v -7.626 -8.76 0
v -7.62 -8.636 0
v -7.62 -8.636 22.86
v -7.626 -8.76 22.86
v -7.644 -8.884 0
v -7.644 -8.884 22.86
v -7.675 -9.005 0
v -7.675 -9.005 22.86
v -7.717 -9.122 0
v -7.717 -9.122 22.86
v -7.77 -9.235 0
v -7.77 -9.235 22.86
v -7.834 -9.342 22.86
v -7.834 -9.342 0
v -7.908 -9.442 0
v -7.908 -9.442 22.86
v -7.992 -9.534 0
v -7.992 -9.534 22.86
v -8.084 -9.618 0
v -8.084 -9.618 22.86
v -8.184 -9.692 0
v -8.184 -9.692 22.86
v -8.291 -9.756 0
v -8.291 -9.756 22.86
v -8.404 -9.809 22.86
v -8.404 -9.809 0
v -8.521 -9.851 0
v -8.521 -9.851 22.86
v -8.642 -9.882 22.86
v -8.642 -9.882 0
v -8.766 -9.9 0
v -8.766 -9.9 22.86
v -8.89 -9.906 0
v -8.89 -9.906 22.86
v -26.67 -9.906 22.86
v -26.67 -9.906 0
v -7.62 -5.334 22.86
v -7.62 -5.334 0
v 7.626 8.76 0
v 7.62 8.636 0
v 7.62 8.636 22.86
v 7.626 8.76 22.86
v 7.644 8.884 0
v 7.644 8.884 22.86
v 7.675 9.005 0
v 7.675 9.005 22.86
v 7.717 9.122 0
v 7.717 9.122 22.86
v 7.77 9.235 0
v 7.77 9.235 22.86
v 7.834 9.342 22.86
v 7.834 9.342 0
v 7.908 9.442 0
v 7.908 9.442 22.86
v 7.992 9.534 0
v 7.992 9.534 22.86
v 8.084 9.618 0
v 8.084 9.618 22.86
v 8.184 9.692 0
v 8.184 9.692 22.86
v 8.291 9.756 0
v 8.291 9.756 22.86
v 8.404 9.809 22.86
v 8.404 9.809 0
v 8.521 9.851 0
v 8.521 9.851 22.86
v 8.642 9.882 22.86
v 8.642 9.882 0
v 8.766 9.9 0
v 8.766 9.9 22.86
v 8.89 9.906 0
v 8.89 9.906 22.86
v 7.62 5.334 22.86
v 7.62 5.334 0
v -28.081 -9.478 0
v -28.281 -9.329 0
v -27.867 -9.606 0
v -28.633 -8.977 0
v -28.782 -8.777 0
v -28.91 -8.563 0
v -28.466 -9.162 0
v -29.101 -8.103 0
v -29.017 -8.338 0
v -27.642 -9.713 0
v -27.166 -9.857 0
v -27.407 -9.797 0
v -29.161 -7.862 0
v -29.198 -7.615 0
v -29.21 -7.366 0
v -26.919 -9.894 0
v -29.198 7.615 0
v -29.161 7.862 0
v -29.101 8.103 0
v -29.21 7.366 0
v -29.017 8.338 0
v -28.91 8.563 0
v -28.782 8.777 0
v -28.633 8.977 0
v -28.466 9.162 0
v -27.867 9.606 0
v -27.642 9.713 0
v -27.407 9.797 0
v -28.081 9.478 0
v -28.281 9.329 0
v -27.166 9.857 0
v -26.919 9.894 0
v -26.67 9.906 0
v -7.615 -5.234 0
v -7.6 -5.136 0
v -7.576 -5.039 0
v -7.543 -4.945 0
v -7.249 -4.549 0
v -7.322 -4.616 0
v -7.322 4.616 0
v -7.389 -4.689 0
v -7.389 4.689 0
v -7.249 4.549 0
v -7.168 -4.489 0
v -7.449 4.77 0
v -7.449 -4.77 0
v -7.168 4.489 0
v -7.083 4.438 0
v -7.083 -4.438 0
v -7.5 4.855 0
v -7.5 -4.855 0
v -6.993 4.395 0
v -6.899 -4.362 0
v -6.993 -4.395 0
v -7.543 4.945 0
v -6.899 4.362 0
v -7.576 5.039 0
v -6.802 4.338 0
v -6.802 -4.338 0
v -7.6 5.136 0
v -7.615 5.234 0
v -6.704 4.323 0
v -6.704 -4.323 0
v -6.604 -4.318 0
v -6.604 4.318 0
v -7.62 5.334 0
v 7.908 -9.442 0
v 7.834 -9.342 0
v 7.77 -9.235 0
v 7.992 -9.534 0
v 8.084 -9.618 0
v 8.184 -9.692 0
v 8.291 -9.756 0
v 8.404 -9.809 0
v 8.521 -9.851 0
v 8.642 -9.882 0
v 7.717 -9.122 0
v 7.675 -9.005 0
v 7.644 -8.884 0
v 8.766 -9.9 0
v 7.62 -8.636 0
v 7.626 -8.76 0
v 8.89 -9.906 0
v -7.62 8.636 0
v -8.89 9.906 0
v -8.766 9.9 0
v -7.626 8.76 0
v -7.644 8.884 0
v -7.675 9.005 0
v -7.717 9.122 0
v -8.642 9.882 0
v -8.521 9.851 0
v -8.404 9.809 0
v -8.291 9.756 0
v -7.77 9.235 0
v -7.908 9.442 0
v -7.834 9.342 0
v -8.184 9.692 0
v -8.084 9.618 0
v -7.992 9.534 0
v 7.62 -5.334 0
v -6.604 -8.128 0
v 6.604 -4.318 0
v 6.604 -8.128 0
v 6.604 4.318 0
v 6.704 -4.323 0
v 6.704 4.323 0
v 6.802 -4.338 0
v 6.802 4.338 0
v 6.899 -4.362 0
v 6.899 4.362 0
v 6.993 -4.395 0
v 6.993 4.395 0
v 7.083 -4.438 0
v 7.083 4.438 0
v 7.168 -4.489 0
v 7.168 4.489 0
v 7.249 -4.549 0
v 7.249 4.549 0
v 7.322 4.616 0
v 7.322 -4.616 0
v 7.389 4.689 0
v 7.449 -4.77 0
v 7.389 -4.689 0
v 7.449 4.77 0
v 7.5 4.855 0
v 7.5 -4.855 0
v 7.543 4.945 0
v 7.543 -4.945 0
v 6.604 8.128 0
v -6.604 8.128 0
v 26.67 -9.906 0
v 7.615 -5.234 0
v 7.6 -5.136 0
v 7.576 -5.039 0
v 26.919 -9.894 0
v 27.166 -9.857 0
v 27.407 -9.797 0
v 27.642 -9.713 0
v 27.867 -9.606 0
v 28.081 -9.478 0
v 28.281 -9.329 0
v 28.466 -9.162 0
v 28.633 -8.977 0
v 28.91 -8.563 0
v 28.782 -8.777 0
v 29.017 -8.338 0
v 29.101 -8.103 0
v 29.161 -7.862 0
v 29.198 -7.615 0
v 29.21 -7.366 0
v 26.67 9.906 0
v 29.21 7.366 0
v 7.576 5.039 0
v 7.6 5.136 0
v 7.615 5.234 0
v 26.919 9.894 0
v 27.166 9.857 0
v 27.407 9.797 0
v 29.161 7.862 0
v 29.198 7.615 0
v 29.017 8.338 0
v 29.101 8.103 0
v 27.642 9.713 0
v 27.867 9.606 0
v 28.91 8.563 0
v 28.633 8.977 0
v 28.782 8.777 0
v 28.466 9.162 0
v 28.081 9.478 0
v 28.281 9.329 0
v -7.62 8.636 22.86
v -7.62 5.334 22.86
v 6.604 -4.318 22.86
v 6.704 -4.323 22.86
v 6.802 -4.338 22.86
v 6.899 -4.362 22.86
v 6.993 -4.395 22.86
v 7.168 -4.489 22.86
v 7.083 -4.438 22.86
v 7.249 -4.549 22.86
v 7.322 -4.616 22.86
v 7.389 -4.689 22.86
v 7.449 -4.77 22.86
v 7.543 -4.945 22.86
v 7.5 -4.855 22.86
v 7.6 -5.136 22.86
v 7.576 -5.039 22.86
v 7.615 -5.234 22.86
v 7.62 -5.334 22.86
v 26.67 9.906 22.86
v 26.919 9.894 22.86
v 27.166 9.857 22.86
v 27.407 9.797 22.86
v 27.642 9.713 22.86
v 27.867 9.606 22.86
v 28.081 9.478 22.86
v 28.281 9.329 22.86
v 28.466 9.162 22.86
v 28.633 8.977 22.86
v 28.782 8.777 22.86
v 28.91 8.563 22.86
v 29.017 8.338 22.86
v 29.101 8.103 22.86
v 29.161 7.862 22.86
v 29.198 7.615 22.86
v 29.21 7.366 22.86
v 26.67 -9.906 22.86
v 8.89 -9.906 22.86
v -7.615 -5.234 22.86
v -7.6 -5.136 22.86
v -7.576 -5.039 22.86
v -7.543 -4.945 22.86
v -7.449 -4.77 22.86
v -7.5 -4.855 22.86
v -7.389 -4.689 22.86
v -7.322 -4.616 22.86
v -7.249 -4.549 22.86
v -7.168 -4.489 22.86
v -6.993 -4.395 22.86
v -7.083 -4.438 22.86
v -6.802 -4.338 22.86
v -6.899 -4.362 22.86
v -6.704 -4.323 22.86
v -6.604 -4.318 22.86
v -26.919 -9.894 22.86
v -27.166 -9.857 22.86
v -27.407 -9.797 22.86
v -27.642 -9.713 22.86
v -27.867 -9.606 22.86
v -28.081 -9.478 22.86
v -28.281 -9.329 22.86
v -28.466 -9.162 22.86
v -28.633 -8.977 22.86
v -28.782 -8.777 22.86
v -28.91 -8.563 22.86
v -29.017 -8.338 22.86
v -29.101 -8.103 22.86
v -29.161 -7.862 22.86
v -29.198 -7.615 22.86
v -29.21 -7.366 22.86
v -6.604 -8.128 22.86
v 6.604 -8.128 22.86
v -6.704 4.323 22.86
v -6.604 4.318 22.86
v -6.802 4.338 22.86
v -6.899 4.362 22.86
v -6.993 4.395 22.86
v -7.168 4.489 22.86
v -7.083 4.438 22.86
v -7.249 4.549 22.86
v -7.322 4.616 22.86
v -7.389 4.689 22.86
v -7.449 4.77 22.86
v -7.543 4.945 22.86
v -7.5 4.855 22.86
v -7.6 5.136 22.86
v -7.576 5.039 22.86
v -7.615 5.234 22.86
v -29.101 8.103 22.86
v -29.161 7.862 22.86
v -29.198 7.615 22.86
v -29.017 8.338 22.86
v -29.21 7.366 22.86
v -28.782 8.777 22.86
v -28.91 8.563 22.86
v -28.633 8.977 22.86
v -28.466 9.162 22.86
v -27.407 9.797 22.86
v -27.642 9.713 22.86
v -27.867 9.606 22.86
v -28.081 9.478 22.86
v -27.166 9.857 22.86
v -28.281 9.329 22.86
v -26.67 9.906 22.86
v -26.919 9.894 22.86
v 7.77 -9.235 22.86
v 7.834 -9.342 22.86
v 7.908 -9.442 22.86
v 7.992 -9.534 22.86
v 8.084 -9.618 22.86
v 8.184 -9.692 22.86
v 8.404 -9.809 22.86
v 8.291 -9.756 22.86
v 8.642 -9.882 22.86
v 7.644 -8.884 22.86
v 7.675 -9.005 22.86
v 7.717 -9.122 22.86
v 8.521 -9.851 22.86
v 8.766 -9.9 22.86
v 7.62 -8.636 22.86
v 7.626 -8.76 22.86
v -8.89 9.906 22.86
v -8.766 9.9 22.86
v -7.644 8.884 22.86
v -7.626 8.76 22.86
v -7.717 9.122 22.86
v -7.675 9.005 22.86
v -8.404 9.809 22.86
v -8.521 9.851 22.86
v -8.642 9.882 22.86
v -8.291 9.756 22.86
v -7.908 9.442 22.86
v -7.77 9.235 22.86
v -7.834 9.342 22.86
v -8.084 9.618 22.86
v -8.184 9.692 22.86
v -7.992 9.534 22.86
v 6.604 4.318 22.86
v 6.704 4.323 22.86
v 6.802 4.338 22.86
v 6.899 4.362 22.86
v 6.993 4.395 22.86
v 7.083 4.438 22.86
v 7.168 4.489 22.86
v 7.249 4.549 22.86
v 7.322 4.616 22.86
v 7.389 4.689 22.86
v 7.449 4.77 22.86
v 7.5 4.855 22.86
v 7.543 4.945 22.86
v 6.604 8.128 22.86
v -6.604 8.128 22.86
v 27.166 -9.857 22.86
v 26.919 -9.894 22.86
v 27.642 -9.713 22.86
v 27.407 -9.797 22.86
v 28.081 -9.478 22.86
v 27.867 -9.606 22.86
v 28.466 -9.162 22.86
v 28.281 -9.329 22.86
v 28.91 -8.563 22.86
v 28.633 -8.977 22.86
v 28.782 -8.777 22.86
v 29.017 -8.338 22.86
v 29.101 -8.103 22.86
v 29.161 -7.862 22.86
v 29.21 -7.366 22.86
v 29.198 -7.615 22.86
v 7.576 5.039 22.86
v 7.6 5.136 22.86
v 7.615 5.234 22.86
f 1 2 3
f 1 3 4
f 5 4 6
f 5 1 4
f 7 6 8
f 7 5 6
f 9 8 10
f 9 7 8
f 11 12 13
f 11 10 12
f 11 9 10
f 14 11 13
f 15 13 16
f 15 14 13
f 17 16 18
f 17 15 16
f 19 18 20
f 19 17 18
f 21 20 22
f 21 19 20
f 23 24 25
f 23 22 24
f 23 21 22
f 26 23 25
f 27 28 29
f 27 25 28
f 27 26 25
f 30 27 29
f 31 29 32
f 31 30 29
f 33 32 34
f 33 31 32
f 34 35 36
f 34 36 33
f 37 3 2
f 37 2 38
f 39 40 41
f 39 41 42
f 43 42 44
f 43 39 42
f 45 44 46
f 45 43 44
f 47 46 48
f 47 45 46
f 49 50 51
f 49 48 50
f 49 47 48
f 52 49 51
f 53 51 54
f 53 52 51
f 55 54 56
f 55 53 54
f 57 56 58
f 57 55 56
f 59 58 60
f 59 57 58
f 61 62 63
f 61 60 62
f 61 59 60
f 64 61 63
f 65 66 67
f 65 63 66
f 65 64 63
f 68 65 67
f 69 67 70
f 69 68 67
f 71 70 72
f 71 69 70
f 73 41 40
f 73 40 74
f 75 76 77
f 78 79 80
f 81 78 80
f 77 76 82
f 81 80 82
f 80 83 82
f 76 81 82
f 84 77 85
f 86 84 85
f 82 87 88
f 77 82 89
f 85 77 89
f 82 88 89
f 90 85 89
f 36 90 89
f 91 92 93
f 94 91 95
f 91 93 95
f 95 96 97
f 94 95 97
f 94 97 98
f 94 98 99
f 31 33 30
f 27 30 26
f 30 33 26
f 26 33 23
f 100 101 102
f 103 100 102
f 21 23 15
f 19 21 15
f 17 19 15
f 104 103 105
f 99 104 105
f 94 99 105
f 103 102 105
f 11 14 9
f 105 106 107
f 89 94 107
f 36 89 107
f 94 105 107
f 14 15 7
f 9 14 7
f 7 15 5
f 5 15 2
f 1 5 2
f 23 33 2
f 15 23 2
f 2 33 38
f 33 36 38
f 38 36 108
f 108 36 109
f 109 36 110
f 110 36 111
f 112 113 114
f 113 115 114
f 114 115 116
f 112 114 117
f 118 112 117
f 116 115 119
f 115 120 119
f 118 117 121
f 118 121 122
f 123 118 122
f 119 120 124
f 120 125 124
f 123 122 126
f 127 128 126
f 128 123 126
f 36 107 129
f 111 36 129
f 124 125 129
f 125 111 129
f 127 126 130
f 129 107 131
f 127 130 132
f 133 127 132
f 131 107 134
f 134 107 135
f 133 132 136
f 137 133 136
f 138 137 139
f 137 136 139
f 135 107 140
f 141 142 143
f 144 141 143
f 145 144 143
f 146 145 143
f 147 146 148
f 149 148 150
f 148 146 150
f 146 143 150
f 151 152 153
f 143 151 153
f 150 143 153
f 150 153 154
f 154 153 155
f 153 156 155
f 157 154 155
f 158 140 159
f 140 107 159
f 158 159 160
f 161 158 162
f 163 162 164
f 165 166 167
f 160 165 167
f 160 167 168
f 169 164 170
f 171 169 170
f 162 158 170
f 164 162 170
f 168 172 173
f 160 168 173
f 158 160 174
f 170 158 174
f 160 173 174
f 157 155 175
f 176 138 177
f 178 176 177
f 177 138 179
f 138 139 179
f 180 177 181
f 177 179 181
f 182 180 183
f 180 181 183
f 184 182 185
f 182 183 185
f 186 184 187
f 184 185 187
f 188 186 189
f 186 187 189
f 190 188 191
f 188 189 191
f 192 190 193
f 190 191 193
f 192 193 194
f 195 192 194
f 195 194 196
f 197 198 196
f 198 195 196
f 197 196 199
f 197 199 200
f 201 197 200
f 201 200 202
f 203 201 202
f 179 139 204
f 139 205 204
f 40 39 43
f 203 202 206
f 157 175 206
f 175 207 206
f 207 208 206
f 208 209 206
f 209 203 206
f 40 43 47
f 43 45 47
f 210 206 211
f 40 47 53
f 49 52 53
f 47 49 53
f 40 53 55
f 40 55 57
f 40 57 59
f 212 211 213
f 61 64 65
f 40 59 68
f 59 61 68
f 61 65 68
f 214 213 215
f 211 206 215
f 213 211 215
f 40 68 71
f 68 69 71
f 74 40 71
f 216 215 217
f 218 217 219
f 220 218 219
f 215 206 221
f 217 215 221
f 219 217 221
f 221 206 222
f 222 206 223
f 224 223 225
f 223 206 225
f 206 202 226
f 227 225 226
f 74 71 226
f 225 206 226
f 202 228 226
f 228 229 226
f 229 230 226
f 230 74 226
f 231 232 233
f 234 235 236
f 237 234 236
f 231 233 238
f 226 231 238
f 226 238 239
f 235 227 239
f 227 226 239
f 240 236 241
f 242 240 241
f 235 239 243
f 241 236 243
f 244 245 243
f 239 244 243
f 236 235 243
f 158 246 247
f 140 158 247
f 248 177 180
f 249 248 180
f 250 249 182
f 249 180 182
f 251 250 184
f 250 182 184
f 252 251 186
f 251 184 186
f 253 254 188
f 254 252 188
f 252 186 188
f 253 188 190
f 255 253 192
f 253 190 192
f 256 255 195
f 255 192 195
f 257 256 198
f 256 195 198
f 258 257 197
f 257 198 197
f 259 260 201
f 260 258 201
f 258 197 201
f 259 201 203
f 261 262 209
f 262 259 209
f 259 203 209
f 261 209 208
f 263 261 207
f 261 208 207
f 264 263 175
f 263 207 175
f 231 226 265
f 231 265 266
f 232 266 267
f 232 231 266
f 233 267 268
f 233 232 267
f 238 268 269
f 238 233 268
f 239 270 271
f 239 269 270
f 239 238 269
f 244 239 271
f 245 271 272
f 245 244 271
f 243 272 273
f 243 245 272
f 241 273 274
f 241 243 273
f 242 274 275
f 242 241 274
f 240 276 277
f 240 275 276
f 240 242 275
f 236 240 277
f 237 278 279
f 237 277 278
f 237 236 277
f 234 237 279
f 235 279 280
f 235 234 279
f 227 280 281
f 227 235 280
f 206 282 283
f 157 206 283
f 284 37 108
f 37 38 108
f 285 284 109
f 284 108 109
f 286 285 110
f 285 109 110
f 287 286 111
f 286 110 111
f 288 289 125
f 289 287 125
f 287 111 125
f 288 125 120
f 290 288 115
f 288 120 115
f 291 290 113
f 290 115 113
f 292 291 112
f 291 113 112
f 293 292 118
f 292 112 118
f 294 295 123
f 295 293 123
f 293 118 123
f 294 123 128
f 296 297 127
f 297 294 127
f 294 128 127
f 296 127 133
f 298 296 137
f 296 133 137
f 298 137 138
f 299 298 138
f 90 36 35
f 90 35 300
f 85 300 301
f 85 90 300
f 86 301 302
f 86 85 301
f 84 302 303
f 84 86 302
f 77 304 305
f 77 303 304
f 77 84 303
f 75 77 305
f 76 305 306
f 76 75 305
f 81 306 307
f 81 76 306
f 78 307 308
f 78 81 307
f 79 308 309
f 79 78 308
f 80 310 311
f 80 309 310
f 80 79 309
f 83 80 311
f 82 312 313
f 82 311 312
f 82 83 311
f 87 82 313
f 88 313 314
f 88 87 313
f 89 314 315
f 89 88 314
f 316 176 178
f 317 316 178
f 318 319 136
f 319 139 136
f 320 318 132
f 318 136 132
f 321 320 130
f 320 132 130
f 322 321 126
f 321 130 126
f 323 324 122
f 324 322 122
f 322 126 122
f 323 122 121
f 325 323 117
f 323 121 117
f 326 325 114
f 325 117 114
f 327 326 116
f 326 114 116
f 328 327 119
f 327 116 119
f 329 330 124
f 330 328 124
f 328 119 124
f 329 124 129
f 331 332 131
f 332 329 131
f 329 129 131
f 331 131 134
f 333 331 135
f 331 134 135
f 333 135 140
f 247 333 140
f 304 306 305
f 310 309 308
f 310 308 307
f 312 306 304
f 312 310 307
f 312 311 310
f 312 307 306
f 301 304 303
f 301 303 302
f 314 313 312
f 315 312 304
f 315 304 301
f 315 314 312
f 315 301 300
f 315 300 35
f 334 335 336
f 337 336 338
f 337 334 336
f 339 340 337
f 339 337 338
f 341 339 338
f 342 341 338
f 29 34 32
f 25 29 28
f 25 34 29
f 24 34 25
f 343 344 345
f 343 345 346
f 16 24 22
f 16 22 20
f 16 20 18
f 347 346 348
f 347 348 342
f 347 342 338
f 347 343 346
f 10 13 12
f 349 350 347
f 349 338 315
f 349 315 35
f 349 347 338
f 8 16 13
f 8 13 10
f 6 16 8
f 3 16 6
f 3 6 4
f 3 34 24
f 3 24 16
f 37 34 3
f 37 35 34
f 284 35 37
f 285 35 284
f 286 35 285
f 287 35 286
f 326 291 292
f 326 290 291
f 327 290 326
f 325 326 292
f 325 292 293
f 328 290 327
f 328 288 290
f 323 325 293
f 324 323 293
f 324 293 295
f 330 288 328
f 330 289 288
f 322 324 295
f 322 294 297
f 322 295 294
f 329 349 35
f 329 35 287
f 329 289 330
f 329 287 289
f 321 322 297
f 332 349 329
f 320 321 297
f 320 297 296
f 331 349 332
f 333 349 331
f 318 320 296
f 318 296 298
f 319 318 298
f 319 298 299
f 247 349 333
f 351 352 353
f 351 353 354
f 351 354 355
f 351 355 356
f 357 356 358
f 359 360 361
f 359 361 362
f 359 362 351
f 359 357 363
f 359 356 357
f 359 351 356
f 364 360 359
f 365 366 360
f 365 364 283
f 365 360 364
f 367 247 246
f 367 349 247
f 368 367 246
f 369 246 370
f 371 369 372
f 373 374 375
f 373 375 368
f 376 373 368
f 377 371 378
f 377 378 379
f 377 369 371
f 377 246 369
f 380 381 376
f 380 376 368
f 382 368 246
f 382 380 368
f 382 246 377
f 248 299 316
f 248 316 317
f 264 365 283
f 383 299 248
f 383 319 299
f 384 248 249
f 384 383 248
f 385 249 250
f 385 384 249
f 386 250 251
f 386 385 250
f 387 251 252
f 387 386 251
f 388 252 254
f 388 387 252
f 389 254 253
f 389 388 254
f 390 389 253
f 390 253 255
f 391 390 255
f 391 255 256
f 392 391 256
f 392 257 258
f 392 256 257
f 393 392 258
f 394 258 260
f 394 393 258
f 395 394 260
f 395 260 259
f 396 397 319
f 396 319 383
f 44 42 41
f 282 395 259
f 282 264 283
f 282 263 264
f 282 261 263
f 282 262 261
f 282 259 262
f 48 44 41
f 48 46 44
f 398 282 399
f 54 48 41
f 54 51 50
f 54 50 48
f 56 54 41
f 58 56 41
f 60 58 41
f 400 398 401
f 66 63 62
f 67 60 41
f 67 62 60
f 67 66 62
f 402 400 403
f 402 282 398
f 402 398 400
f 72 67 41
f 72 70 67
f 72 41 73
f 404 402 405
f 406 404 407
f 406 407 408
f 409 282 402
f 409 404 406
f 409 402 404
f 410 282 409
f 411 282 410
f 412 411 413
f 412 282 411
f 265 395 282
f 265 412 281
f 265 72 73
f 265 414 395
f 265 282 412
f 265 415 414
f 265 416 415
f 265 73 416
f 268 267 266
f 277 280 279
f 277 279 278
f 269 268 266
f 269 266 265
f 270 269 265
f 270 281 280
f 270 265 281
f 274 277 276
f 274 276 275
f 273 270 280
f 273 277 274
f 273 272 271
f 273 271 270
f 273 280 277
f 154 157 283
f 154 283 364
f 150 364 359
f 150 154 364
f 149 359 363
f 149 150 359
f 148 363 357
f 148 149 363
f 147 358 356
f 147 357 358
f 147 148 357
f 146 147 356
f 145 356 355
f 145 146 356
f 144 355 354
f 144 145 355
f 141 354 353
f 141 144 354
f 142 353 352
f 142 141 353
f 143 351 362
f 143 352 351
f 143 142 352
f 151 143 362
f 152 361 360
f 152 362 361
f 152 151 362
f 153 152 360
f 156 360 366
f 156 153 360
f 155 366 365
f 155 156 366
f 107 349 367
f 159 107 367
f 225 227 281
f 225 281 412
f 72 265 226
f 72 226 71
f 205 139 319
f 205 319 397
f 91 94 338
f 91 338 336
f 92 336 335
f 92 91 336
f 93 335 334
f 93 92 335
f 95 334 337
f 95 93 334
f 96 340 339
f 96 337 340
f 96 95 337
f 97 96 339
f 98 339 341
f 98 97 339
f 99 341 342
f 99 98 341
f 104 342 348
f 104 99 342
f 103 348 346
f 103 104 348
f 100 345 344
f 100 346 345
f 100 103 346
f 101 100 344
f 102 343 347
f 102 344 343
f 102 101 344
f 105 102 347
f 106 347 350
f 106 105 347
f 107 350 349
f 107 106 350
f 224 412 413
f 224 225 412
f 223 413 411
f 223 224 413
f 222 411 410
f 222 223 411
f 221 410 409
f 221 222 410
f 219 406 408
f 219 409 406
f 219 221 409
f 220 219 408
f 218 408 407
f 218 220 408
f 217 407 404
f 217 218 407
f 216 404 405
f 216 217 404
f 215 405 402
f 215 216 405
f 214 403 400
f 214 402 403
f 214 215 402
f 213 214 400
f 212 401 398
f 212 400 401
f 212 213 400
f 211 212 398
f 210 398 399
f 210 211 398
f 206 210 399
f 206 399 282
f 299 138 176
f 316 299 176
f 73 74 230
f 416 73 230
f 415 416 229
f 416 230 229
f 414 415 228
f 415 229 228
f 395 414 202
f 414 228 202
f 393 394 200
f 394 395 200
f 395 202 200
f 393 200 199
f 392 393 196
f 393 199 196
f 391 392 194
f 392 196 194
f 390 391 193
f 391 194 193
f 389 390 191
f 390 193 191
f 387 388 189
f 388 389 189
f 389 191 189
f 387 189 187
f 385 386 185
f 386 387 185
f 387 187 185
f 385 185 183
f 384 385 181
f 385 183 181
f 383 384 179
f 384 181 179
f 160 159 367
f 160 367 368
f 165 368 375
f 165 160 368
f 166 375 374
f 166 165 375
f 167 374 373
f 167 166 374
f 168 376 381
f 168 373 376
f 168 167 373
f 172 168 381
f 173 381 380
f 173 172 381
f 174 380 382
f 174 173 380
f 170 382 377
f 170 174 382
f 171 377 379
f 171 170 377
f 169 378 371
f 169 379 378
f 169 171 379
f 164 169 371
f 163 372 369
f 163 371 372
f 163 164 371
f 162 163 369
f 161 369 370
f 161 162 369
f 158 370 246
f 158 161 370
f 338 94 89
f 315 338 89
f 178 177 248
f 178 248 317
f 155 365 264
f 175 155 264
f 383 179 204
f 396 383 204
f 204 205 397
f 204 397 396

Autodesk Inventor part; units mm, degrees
ref_plane "YZ Plane" through (0, 0, 0) normal (1, 0, 0) x (0, 1, 0)
ref_plane "XZ Plane" through (0, 0, 0) normal (0, 1, 0) x (-1, 0, 0)
ref_plane "XY Plane" through (0, 0, 0) normal (0, 0, 1) x (1, 0, 0)
sketch "Sketch1" plane through (0, 0, 0) normal (0, 0, 1) x (1, 0, 0)
  line L0 (-26.67, 9.906) -> (-8.89, 9.906)
  line L1 (-7.62, 8.636) -> (-7.62, 5.334)
  line L2 (-6.604, 4.318) -> (-6.604, 4.318)
  line L3 (-6.604, 4.318) -> (-6.604, 8.128)
  line L4 (-6.604, 8.128) -> (0, 8.128)
  line L5 (-29.21, 7.366) -> (-29.21, 0)
  line L6 (0, 8.128) -> (0, 0)
  line L7 (0, 0) -> (-29.21, 0)
  arc A0 (-7.62, 5.334) -> (-6.604, 4.318) centre (-6.604, 5.334) ccw
  arc A1 (-7.62, 8.636) -> (-8.89, 9.906) centre (-8.89, 8.636) ccw
  arc A2 (-26.67, 9.906) -> (-29.21, 7.366) centre (-26.67, 7.366) ccw
  line L8 (26.67, 9.906) -> (8.89, 9.906)
  line L9 (7.62, 8.636) -> (7.62, 5.334)
  line L10 (6.604, 4.318) -> (6.604, 4.318)
  line L11 (6.604, 4.318) -> (6.604, 8.128)
  line L12 (6.604, 8.128) -> (0, 8.128)
  line L13 (29.21, 7.366) -> (29.21, 0)
  line L14 (0, 0) -> (29.21, 0)
  arc A3 (6.604, 4.318) -> (7.62, 5.334) centre (6.604, 5.334) ccw
  arc A4 (8.89, 9.906) -> (7.62, 8.636) centre (8.89, 8.636) ccw
  arc A5 (29.21, 7.366) -> (26.67, 9.906) centre (26.67, 7.366) ccw
  line L15 (-26.67, -9.906) -> (-8.89, -9.906)
  line L16 (-7.62, -8.636) -> (-7.62, -8.128)
  line L17 (-6.604, -4.318) -> (-6.604, -8.128)
  line L18 (-6.604, -8.128) -> (0, -8.128)
  line L19 (-29.21, -7.366) -> (-29.21, 0)
  line L20 (0, -8.128) -> (0, 0)
  arc A6 (-8.89, -9.906) -> (-7.62, -8.636) centre (-8.89, -8.636) ccw
  arc A7 (-29.21, -7.366) -> (-26.67, -9.906) centre (-26.67, -7.366) ccw
  line L21 (29.21, -7.366) -> (29.21, 0)
  arc A8 (26.67, -9.906) -> (29.21, -7.366) centre (26.67, -7.366) ccw
  line L22 (26.67, -9.906) -> (8.89, -9.906)
  arc A9 (7.62, -8.636) -> (8.89, -9.906) centre (8.89, -8.636) ccw
  line L23 (6.604, -4.318) -> (6.604, -8.128)
  line L24 (6.604, -8.128) -> (0, -8.128)
  line L25 (-7.62, -8.636) -> (-7.62, -5.334)
  line L26 (-7.62, -5.334) -> (-7.62, -5.334)
  line L27 (-6.604, -4.318) -> (-6.604, -4.318)
  arc A10 (-6.604, -4.318) -> (-7.62, -5.334) centre (-6.604, -5.334) ccw
  line L28 (7.62, -8.636) -> (7.62, -5.334)
  line L29 (7.62, -5.334) -> (7.62, -5.334)
  line L30 (6.604, -4.318) -> (6.604, -4.318)
  arc A11 (7.62, -5.334) -> (6.604, -4.318) centre (6.604, -5.334) ccw
  point P0 (-7.62, -4.318)
  dimension "d0" = 29.21
  dimension "d1" = 7.62
  dimension "d2" = 1.016
  dimension "d3" = 5.588
  dimension "d4" = 9.906
  dimension "d5" = 8.128
  dimension "d6" = 1.016
  dimension "d7" = 1.27
  dimension "d8" = 2.54
  dimension "d9" = 1.016
  dimension "d10" = 1.016
extrude "Extrusion1" add sketch "Sketch1" along normal blind 22.86
properties part number "ARTHURw5.5bAutomobloxConnectorPiece"
